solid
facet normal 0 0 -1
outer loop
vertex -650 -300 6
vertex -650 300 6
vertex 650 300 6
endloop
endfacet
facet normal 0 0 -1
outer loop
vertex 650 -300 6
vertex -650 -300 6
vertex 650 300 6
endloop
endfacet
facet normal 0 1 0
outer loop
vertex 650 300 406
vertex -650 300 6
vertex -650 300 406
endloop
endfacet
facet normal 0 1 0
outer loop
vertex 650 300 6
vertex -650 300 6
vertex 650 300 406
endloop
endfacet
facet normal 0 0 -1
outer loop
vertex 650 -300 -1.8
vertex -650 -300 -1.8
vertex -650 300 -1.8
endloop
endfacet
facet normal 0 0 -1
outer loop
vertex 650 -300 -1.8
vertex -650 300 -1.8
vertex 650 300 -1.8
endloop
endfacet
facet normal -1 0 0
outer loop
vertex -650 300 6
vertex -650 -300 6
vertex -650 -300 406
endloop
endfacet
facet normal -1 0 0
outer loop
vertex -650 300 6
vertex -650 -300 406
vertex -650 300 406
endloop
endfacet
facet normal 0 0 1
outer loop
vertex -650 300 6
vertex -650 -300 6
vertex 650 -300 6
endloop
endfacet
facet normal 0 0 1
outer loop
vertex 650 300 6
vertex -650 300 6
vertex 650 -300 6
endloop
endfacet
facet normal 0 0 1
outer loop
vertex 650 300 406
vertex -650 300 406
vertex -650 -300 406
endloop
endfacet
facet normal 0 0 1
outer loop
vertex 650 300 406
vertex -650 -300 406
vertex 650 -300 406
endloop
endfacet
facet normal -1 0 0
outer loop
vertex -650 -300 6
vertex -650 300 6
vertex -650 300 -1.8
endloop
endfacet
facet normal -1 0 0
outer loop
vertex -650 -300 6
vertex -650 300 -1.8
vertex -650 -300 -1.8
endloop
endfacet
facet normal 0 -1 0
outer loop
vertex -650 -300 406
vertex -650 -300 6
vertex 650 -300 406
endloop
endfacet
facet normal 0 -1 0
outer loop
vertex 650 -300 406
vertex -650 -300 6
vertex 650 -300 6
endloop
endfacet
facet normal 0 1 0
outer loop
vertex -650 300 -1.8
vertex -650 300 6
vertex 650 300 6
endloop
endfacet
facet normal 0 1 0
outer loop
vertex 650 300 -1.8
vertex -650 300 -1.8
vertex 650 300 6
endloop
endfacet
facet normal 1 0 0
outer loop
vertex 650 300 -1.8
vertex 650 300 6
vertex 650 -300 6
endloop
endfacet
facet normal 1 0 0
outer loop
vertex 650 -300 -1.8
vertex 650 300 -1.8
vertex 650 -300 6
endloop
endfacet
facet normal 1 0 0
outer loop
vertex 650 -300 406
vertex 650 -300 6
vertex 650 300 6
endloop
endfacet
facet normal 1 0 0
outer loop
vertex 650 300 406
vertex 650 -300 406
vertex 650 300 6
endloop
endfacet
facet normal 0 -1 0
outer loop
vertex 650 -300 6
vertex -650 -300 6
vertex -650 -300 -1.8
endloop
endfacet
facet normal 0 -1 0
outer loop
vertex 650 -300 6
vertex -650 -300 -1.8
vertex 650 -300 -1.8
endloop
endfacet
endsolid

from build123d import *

# Parameters (mm, degrees)
F1_W     = 1300
F1_H     = 600
F2_DEPTH = 400
F3_W     = 1300
F3_H     = 600
F4_DEPTH = 7.8


with BuildPart() as f2:
    # F1 (on offset) → F2 (new body)
    with BuildSketch(Plane.XY.offset(6)):
        Rectangle(F1_W, F1_H)
    extrude(amount=F2_DEPTH)


with BuildPart() as f4:
    # F3 (on face) → F4 (new body)
    with BuildSketch(Plane(origin=(0, 0, 6), x_dir=(1, 0, 0), z_dir=(0, 0, -1))):
        Rectangle(F3_W, F3_H)
    extrude(amount=F4_DEPTH)


solid = Compound([f2.part, f4.part])
